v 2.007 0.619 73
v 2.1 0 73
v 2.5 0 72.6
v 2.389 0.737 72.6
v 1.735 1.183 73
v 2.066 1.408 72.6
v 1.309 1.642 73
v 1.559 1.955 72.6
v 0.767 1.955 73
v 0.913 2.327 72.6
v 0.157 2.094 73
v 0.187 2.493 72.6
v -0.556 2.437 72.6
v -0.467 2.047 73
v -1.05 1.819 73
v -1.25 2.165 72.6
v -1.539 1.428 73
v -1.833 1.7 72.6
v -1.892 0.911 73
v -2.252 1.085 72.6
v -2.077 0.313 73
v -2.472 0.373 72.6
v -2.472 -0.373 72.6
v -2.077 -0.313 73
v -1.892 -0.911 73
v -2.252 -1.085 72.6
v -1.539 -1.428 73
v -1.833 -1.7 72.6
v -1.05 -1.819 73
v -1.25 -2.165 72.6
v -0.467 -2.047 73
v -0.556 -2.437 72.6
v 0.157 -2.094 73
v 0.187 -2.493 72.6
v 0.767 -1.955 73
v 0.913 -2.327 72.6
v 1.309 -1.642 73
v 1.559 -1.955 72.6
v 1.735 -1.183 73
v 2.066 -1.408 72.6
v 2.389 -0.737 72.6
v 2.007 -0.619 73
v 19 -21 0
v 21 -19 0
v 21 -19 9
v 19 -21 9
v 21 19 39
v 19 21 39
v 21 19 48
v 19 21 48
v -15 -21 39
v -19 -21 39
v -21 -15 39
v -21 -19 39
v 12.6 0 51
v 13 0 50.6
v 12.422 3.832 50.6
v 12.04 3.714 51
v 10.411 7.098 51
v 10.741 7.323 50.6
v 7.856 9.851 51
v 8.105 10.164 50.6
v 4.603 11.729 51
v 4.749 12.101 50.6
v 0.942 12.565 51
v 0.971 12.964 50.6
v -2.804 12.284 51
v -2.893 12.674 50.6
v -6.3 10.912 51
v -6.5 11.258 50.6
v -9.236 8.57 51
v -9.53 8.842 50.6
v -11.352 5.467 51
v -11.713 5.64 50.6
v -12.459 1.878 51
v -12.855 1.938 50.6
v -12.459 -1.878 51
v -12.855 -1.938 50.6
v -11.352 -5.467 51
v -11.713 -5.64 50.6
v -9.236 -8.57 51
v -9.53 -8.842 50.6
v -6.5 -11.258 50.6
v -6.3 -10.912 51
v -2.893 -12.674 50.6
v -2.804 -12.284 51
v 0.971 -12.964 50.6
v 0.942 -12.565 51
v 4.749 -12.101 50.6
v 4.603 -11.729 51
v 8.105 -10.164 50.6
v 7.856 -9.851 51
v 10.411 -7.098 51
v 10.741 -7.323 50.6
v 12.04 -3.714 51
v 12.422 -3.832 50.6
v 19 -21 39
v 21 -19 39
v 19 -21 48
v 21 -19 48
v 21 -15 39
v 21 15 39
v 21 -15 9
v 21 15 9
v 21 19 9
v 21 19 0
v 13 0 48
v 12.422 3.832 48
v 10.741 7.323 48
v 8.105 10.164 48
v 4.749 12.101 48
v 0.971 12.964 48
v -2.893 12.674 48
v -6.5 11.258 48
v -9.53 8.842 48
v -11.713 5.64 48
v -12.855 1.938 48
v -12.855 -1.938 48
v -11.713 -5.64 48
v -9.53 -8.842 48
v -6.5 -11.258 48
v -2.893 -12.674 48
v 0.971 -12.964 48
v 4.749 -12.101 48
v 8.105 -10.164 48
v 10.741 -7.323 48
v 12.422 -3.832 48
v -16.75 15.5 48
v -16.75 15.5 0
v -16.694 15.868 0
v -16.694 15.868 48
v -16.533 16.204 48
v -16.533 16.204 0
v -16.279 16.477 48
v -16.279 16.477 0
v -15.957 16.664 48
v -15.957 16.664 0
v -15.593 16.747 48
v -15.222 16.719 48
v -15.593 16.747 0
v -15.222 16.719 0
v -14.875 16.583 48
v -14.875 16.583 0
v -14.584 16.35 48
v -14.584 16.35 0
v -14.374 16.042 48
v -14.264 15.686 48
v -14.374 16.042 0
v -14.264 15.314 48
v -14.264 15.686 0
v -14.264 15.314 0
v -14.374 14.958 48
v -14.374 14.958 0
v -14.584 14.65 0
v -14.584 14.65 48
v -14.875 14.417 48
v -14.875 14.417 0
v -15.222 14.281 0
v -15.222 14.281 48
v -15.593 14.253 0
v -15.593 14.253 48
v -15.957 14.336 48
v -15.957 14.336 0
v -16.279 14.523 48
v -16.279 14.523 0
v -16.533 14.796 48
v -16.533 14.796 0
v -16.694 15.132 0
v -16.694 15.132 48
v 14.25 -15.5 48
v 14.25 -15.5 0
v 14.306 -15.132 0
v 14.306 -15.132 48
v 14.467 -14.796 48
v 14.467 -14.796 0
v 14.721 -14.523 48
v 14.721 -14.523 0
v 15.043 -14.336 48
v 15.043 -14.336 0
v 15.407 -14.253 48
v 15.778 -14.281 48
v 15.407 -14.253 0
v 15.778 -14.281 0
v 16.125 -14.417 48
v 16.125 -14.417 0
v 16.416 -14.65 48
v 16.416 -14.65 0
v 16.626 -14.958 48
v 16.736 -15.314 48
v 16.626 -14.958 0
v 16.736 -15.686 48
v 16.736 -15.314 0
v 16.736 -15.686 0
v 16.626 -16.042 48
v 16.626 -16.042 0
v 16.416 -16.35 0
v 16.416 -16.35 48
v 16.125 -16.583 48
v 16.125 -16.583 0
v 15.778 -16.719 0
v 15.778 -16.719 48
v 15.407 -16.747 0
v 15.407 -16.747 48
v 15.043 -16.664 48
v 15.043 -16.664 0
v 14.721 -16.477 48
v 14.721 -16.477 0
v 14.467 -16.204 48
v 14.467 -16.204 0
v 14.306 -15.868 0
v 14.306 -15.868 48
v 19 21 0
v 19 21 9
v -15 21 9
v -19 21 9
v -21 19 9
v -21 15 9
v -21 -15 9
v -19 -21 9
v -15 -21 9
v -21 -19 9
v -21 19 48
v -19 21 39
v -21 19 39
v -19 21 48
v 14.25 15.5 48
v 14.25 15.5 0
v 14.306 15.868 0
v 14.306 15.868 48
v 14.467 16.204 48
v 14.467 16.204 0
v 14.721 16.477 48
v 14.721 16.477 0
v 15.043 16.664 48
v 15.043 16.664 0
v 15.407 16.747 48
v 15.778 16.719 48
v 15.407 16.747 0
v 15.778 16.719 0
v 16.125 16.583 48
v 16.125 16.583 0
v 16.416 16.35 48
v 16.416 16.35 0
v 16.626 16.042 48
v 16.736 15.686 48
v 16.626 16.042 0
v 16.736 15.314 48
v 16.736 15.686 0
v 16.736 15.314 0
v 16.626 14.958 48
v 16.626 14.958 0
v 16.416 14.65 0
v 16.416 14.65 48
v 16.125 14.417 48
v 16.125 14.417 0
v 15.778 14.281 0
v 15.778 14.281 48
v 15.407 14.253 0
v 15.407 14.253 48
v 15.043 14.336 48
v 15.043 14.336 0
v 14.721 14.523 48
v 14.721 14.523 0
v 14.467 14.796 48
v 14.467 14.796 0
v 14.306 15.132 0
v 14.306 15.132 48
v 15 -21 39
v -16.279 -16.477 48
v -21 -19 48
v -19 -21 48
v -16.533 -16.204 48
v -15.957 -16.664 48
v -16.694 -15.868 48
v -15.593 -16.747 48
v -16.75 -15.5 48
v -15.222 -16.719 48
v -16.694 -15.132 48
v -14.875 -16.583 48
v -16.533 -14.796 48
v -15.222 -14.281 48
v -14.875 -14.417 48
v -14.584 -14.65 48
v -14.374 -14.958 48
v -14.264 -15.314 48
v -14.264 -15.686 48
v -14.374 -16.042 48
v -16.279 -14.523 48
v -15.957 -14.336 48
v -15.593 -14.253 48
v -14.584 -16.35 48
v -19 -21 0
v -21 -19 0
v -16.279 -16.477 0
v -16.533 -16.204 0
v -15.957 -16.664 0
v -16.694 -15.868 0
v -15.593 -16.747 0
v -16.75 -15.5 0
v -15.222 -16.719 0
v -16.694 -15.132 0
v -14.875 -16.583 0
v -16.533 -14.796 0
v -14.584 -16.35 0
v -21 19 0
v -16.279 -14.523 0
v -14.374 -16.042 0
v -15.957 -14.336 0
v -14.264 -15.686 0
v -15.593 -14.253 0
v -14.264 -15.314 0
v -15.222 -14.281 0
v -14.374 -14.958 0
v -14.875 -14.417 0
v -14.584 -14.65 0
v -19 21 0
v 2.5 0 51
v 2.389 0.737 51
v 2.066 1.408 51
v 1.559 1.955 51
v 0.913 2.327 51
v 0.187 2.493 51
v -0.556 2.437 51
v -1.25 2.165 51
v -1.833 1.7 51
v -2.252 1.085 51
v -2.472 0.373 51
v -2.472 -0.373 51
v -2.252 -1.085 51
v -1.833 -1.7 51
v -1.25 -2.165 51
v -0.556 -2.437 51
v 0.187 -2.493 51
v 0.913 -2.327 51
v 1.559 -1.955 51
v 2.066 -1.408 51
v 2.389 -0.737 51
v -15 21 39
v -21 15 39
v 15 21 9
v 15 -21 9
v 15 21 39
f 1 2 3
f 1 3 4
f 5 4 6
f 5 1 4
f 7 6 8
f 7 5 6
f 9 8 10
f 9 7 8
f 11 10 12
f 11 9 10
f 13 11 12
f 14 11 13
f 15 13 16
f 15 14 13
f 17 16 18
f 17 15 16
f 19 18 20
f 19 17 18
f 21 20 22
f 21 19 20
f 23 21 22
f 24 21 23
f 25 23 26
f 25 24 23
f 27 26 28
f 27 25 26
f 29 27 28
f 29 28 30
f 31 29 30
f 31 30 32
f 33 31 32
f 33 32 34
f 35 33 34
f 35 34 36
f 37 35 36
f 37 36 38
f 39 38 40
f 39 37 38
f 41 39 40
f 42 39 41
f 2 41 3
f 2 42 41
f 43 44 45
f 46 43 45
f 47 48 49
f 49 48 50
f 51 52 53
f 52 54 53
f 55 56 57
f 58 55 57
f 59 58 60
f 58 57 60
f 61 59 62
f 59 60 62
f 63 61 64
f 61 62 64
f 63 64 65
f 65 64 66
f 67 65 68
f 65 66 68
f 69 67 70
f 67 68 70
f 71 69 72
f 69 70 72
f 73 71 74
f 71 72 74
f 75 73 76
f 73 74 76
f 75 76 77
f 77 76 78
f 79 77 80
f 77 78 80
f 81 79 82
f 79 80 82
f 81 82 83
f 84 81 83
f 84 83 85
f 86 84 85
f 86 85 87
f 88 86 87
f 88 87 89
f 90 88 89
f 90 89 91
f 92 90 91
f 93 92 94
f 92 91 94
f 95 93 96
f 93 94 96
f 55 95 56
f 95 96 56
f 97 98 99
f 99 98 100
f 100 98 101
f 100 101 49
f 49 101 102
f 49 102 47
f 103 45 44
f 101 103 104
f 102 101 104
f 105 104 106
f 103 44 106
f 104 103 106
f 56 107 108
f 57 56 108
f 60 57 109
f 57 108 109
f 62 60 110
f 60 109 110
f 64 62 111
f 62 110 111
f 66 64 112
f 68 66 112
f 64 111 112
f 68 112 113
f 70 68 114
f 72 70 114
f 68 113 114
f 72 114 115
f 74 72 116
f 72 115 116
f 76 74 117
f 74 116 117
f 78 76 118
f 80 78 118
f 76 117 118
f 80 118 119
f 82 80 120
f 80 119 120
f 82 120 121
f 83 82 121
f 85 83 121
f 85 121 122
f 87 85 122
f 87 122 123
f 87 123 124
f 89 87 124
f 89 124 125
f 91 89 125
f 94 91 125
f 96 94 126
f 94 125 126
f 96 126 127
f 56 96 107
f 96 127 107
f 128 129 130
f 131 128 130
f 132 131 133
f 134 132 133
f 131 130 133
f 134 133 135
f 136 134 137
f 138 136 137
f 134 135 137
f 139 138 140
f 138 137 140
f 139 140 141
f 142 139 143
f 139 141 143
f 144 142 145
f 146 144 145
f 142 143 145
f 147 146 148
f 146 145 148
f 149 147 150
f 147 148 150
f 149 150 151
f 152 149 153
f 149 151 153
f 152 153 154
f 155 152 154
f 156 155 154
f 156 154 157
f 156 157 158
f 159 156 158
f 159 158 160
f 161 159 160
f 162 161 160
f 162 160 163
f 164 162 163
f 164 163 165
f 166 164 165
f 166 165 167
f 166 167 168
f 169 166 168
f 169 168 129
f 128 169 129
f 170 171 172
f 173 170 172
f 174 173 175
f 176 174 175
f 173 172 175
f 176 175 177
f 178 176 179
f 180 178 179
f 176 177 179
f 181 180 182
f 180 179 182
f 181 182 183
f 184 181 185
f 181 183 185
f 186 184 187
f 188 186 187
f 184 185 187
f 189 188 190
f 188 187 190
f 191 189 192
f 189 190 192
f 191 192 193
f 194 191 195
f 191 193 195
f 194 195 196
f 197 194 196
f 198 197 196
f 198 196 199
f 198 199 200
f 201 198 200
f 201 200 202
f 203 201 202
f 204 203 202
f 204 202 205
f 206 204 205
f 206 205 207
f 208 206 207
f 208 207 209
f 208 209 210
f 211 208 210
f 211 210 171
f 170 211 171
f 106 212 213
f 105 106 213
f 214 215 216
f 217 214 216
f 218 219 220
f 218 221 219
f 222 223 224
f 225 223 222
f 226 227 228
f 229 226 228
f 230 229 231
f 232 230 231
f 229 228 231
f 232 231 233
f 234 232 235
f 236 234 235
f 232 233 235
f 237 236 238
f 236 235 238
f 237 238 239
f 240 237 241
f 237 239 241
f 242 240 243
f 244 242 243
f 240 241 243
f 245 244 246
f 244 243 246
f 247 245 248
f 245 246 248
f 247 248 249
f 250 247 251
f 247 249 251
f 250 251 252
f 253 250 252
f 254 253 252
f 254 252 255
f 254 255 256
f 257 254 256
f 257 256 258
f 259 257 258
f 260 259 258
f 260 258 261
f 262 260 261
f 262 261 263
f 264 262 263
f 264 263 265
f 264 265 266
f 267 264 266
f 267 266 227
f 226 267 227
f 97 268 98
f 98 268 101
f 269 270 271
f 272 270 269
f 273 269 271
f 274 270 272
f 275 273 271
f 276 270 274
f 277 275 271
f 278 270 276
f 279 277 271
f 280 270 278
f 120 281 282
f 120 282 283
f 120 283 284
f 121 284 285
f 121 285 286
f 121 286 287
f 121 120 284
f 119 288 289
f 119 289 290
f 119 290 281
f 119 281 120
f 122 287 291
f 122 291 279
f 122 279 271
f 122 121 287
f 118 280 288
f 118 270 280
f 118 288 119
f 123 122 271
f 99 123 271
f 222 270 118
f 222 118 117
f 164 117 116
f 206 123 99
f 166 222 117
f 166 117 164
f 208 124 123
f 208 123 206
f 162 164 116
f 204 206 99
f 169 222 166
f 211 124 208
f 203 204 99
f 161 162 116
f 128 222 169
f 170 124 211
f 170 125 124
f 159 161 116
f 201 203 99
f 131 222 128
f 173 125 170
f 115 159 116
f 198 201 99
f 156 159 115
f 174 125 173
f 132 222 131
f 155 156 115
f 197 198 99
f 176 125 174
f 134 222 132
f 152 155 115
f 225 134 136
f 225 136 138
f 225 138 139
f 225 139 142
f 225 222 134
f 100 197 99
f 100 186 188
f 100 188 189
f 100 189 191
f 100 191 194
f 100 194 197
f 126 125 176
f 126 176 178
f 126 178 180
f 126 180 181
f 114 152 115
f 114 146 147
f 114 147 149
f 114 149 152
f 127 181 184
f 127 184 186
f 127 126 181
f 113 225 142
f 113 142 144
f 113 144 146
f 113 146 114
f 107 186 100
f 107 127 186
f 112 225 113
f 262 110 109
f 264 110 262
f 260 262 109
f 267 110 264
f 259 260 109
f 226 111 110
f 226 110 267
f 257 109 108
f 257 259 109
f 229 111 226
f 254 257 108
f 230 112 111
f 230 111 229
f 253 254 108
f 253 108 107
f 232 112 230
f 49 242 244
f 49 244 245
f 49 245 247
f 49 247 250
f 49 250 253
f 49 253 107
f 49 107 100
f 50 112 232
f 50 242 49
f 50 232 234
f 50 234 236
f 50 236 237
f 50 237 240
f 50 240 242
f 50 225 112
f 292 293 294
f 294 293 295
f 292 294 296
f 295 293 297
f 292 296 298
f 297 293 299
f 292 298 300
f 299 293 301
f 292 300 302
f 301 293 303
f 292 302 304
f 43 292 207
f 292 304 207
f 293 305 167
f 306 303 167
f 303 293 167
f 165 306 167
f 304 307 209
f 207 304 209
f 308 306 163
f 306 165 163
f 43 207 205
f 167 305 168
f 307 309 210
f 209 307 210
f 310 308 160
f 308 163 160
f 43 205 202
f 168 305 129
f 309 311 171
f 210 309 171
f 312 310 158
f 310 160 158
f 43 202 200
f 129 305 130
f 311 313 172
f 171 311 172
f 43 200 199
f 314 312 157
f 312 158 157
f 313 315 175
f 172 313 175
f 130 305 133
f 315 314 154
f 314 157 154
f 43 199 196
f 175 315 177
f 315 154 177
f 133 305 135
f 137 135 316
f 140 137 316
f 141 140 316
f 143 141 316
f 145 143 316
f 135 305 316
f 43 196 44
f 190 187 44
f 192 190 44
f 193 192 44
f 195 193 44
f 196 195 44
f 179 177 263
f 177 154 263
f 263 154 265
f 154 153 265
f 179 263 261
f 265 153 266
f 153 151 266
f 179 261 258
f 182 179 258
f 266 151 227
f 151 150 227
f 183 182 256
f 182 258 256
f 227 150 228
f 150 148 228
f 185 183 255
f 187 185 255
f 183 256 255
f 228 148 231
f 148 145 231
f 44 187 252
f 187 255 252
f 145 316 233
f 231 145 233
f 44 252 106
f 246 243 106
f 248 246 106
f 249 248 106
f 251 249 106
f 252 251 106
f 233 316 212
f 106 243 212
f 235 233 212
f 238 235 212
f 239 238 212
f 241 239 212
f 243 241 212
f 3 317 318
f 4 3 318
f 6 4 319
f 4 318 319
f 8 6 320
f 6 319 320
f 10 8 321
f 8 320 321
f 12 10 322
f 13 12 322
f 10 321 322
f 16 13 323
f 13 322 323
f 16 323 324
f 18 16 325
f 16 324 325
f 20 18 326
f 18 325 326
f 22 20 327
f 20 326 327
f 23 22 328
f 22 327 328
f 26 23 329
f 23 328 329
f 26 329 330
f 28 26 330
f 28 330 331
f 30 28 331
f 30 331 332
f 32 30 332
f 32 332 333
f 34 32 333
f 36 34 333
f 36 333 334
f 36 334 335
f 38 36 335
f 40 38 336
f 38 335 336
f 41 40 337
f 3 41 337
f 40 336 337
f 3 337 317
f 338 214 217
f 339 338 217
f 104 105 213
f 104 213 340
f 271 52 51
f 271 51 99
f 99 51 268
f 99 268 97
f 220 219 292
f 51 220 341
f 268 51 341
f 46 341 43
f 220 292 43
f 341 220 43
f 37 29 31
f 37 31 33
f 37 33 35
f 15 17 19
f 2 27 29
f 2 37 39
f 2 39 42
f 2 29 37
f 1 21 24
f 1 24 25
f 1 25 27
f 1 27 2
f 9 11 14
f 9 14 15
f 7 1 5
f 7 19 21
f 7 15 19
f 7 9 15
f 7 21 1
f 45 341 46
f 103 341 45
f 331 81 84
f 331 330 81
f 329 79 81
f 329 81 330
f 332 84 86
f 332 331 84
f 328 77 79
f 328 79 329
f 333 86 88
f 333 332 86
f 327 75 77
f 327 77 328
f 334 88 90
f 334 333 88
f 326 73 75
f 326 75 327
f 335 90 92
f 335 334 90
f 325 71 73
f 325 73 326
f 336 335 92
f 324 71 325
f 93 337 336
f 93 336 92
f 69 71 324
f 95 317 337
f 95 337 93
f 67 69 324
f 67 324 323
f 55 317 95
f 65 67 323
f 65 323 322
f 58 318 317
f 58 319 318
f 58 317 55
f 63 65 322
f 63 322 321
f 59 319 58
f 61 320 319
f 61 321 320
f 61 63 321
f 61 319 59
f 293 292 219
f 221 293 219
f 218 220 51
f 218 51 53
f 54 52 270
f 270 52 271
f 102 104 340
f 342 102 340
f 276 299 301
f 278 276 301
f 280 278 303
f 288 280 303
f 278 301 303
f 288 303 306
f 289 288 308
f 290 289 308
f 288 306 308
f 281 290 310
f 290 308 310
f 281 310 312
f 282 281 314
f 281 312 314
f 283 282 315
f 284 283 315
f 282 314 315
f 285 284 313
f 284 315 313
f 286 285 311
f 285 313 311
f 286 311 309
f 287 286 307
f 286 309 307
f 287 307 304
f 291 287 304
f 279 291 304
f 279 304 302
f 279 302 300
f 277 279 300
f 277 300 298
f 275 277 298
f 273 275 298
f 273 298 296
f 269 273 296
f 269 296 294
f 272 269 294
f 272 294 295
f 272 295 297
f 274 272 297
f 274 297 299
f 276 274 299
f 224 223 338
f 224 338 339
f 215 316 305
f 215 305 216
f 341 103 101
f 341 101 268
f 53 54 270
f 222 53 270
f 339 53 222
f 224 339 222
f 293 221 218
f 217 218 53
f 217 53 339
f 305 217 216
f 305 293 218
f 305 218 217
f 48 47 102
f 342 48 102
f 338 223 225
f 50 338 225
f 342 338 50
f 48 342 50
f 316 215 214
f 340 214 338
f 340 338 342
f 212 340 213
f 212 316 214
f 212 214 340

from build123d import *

# Parameters (mm, degrees)
ESQUISSE1_W                               = 42
ESQUISSE1_H                               = 42
BOSS_EXTRU_1_DEPTH                        = 48
CHANFREIN1_SIZE                           = 2
ESQUISSE3_R                               = 13
BOSS_EXTRU_2_DEPTH                        = 3
TROU_POUR_TARAUDAGE_POUR_TROU_TARAUD_M3_D = 2.5
ESQUISSE7_R                               = 2.5
BOSS_EXTRU_3_DEPTH                        = 22
CHANFREIN2_SIZE                           = 0.4
CHANFREIN3_SIZE                           = 0.4
ENL_V_START                               = -9
ENL_V_MAT_EXTRU_1_DEPTH                   = 30


with BuildPart() as part:
    # Esquisse1 → Boss.-Extru.1 (new body)
    with BuildSketch(Plane.XY):
        Rectangle(ESQUISSE1_W, ESQUISSE1_H)
    extrude(amount=BOSS_EXTRU_1_DEPTH)

    # Chanfrein1
    chanfrein1_edges = [part.edges().sort_by_distance(p)[0] for p in [
        (-21, 21, 24),
        (21, 21, 24),
        (21, -21, 24),
        (-21, -21, 24),
    ]]
    chamfer(chanfrein1_edges, length=CHANFREIN1_SIZE)

    # Esquisse3 → Boss.-Extru.2 (add)
    with BuildSketch(Plane.XY.offset(48)):
        Circle(ESQUISSE3_R)
    extrude(amount=BOSS_EXTRU_2_DEPTH)

    # Trou pour taraudage pour trou taraudé M3x0.51 (through all)
    with Locations(Plane.XY.offset(48)):
        with Locations((-15.5, 15.5), (-15.5, -15.5), (15.5, -15.5), (15.5, 15.5)):
            Hole(TROU_POUR_TARAUDAGE_POUR_TROU_TARAUD_M3_D / 2)

    # Esquisse7 → Boss.-Extru.3 (add)
    with BuildSketch(Plane.XY.offset(51)):
        Circle(ESQUISSE7_R)
    extrude(amount=BOSS_EXTRU_3_DEPTH)

    # Chanfrein2
    chanfrein2_edges = [part.edges().sort_by_distance(p)[0] for p in [
        (-2.5, 0, 73),
    ]]
    chamfer(chanfrein2_edges, length=CHANFREIN2_SIZE)

    # Chanfrein3
    chanfrein3_edges = [part.edges().sort_by_distance(p)[0] for p in [
        (-13, 0, 51),
    ]]
    chamfer(chanfrein3_edges, length=CHANFREIN3_SIZE)

    # Esquisse9 → Enlèv. mat.-Extru.1 (cut)
    with BuildSketch(Plane(origin=(0, 0, 0), x_dir=(-1, 0, 0), z_dir=(0, 0, -1)).offset(ENL_V_START)):
        Polygon((-21, 15), (-15, 21), (-21, 21), align=None)
        Polygon((15, 21), (21, 15), (21, 21), align=None)
        Polygon((-21, -15), (-15, -21), (-21, -21), align=None)
        Polygon((15, -21), (21, -15), (21, -21), align=None)
    extrude(amount=-ENL_V_MAT_EXTRU_1_DEPTH, mode=Mode.SUBTRACT)


solid = part.part
